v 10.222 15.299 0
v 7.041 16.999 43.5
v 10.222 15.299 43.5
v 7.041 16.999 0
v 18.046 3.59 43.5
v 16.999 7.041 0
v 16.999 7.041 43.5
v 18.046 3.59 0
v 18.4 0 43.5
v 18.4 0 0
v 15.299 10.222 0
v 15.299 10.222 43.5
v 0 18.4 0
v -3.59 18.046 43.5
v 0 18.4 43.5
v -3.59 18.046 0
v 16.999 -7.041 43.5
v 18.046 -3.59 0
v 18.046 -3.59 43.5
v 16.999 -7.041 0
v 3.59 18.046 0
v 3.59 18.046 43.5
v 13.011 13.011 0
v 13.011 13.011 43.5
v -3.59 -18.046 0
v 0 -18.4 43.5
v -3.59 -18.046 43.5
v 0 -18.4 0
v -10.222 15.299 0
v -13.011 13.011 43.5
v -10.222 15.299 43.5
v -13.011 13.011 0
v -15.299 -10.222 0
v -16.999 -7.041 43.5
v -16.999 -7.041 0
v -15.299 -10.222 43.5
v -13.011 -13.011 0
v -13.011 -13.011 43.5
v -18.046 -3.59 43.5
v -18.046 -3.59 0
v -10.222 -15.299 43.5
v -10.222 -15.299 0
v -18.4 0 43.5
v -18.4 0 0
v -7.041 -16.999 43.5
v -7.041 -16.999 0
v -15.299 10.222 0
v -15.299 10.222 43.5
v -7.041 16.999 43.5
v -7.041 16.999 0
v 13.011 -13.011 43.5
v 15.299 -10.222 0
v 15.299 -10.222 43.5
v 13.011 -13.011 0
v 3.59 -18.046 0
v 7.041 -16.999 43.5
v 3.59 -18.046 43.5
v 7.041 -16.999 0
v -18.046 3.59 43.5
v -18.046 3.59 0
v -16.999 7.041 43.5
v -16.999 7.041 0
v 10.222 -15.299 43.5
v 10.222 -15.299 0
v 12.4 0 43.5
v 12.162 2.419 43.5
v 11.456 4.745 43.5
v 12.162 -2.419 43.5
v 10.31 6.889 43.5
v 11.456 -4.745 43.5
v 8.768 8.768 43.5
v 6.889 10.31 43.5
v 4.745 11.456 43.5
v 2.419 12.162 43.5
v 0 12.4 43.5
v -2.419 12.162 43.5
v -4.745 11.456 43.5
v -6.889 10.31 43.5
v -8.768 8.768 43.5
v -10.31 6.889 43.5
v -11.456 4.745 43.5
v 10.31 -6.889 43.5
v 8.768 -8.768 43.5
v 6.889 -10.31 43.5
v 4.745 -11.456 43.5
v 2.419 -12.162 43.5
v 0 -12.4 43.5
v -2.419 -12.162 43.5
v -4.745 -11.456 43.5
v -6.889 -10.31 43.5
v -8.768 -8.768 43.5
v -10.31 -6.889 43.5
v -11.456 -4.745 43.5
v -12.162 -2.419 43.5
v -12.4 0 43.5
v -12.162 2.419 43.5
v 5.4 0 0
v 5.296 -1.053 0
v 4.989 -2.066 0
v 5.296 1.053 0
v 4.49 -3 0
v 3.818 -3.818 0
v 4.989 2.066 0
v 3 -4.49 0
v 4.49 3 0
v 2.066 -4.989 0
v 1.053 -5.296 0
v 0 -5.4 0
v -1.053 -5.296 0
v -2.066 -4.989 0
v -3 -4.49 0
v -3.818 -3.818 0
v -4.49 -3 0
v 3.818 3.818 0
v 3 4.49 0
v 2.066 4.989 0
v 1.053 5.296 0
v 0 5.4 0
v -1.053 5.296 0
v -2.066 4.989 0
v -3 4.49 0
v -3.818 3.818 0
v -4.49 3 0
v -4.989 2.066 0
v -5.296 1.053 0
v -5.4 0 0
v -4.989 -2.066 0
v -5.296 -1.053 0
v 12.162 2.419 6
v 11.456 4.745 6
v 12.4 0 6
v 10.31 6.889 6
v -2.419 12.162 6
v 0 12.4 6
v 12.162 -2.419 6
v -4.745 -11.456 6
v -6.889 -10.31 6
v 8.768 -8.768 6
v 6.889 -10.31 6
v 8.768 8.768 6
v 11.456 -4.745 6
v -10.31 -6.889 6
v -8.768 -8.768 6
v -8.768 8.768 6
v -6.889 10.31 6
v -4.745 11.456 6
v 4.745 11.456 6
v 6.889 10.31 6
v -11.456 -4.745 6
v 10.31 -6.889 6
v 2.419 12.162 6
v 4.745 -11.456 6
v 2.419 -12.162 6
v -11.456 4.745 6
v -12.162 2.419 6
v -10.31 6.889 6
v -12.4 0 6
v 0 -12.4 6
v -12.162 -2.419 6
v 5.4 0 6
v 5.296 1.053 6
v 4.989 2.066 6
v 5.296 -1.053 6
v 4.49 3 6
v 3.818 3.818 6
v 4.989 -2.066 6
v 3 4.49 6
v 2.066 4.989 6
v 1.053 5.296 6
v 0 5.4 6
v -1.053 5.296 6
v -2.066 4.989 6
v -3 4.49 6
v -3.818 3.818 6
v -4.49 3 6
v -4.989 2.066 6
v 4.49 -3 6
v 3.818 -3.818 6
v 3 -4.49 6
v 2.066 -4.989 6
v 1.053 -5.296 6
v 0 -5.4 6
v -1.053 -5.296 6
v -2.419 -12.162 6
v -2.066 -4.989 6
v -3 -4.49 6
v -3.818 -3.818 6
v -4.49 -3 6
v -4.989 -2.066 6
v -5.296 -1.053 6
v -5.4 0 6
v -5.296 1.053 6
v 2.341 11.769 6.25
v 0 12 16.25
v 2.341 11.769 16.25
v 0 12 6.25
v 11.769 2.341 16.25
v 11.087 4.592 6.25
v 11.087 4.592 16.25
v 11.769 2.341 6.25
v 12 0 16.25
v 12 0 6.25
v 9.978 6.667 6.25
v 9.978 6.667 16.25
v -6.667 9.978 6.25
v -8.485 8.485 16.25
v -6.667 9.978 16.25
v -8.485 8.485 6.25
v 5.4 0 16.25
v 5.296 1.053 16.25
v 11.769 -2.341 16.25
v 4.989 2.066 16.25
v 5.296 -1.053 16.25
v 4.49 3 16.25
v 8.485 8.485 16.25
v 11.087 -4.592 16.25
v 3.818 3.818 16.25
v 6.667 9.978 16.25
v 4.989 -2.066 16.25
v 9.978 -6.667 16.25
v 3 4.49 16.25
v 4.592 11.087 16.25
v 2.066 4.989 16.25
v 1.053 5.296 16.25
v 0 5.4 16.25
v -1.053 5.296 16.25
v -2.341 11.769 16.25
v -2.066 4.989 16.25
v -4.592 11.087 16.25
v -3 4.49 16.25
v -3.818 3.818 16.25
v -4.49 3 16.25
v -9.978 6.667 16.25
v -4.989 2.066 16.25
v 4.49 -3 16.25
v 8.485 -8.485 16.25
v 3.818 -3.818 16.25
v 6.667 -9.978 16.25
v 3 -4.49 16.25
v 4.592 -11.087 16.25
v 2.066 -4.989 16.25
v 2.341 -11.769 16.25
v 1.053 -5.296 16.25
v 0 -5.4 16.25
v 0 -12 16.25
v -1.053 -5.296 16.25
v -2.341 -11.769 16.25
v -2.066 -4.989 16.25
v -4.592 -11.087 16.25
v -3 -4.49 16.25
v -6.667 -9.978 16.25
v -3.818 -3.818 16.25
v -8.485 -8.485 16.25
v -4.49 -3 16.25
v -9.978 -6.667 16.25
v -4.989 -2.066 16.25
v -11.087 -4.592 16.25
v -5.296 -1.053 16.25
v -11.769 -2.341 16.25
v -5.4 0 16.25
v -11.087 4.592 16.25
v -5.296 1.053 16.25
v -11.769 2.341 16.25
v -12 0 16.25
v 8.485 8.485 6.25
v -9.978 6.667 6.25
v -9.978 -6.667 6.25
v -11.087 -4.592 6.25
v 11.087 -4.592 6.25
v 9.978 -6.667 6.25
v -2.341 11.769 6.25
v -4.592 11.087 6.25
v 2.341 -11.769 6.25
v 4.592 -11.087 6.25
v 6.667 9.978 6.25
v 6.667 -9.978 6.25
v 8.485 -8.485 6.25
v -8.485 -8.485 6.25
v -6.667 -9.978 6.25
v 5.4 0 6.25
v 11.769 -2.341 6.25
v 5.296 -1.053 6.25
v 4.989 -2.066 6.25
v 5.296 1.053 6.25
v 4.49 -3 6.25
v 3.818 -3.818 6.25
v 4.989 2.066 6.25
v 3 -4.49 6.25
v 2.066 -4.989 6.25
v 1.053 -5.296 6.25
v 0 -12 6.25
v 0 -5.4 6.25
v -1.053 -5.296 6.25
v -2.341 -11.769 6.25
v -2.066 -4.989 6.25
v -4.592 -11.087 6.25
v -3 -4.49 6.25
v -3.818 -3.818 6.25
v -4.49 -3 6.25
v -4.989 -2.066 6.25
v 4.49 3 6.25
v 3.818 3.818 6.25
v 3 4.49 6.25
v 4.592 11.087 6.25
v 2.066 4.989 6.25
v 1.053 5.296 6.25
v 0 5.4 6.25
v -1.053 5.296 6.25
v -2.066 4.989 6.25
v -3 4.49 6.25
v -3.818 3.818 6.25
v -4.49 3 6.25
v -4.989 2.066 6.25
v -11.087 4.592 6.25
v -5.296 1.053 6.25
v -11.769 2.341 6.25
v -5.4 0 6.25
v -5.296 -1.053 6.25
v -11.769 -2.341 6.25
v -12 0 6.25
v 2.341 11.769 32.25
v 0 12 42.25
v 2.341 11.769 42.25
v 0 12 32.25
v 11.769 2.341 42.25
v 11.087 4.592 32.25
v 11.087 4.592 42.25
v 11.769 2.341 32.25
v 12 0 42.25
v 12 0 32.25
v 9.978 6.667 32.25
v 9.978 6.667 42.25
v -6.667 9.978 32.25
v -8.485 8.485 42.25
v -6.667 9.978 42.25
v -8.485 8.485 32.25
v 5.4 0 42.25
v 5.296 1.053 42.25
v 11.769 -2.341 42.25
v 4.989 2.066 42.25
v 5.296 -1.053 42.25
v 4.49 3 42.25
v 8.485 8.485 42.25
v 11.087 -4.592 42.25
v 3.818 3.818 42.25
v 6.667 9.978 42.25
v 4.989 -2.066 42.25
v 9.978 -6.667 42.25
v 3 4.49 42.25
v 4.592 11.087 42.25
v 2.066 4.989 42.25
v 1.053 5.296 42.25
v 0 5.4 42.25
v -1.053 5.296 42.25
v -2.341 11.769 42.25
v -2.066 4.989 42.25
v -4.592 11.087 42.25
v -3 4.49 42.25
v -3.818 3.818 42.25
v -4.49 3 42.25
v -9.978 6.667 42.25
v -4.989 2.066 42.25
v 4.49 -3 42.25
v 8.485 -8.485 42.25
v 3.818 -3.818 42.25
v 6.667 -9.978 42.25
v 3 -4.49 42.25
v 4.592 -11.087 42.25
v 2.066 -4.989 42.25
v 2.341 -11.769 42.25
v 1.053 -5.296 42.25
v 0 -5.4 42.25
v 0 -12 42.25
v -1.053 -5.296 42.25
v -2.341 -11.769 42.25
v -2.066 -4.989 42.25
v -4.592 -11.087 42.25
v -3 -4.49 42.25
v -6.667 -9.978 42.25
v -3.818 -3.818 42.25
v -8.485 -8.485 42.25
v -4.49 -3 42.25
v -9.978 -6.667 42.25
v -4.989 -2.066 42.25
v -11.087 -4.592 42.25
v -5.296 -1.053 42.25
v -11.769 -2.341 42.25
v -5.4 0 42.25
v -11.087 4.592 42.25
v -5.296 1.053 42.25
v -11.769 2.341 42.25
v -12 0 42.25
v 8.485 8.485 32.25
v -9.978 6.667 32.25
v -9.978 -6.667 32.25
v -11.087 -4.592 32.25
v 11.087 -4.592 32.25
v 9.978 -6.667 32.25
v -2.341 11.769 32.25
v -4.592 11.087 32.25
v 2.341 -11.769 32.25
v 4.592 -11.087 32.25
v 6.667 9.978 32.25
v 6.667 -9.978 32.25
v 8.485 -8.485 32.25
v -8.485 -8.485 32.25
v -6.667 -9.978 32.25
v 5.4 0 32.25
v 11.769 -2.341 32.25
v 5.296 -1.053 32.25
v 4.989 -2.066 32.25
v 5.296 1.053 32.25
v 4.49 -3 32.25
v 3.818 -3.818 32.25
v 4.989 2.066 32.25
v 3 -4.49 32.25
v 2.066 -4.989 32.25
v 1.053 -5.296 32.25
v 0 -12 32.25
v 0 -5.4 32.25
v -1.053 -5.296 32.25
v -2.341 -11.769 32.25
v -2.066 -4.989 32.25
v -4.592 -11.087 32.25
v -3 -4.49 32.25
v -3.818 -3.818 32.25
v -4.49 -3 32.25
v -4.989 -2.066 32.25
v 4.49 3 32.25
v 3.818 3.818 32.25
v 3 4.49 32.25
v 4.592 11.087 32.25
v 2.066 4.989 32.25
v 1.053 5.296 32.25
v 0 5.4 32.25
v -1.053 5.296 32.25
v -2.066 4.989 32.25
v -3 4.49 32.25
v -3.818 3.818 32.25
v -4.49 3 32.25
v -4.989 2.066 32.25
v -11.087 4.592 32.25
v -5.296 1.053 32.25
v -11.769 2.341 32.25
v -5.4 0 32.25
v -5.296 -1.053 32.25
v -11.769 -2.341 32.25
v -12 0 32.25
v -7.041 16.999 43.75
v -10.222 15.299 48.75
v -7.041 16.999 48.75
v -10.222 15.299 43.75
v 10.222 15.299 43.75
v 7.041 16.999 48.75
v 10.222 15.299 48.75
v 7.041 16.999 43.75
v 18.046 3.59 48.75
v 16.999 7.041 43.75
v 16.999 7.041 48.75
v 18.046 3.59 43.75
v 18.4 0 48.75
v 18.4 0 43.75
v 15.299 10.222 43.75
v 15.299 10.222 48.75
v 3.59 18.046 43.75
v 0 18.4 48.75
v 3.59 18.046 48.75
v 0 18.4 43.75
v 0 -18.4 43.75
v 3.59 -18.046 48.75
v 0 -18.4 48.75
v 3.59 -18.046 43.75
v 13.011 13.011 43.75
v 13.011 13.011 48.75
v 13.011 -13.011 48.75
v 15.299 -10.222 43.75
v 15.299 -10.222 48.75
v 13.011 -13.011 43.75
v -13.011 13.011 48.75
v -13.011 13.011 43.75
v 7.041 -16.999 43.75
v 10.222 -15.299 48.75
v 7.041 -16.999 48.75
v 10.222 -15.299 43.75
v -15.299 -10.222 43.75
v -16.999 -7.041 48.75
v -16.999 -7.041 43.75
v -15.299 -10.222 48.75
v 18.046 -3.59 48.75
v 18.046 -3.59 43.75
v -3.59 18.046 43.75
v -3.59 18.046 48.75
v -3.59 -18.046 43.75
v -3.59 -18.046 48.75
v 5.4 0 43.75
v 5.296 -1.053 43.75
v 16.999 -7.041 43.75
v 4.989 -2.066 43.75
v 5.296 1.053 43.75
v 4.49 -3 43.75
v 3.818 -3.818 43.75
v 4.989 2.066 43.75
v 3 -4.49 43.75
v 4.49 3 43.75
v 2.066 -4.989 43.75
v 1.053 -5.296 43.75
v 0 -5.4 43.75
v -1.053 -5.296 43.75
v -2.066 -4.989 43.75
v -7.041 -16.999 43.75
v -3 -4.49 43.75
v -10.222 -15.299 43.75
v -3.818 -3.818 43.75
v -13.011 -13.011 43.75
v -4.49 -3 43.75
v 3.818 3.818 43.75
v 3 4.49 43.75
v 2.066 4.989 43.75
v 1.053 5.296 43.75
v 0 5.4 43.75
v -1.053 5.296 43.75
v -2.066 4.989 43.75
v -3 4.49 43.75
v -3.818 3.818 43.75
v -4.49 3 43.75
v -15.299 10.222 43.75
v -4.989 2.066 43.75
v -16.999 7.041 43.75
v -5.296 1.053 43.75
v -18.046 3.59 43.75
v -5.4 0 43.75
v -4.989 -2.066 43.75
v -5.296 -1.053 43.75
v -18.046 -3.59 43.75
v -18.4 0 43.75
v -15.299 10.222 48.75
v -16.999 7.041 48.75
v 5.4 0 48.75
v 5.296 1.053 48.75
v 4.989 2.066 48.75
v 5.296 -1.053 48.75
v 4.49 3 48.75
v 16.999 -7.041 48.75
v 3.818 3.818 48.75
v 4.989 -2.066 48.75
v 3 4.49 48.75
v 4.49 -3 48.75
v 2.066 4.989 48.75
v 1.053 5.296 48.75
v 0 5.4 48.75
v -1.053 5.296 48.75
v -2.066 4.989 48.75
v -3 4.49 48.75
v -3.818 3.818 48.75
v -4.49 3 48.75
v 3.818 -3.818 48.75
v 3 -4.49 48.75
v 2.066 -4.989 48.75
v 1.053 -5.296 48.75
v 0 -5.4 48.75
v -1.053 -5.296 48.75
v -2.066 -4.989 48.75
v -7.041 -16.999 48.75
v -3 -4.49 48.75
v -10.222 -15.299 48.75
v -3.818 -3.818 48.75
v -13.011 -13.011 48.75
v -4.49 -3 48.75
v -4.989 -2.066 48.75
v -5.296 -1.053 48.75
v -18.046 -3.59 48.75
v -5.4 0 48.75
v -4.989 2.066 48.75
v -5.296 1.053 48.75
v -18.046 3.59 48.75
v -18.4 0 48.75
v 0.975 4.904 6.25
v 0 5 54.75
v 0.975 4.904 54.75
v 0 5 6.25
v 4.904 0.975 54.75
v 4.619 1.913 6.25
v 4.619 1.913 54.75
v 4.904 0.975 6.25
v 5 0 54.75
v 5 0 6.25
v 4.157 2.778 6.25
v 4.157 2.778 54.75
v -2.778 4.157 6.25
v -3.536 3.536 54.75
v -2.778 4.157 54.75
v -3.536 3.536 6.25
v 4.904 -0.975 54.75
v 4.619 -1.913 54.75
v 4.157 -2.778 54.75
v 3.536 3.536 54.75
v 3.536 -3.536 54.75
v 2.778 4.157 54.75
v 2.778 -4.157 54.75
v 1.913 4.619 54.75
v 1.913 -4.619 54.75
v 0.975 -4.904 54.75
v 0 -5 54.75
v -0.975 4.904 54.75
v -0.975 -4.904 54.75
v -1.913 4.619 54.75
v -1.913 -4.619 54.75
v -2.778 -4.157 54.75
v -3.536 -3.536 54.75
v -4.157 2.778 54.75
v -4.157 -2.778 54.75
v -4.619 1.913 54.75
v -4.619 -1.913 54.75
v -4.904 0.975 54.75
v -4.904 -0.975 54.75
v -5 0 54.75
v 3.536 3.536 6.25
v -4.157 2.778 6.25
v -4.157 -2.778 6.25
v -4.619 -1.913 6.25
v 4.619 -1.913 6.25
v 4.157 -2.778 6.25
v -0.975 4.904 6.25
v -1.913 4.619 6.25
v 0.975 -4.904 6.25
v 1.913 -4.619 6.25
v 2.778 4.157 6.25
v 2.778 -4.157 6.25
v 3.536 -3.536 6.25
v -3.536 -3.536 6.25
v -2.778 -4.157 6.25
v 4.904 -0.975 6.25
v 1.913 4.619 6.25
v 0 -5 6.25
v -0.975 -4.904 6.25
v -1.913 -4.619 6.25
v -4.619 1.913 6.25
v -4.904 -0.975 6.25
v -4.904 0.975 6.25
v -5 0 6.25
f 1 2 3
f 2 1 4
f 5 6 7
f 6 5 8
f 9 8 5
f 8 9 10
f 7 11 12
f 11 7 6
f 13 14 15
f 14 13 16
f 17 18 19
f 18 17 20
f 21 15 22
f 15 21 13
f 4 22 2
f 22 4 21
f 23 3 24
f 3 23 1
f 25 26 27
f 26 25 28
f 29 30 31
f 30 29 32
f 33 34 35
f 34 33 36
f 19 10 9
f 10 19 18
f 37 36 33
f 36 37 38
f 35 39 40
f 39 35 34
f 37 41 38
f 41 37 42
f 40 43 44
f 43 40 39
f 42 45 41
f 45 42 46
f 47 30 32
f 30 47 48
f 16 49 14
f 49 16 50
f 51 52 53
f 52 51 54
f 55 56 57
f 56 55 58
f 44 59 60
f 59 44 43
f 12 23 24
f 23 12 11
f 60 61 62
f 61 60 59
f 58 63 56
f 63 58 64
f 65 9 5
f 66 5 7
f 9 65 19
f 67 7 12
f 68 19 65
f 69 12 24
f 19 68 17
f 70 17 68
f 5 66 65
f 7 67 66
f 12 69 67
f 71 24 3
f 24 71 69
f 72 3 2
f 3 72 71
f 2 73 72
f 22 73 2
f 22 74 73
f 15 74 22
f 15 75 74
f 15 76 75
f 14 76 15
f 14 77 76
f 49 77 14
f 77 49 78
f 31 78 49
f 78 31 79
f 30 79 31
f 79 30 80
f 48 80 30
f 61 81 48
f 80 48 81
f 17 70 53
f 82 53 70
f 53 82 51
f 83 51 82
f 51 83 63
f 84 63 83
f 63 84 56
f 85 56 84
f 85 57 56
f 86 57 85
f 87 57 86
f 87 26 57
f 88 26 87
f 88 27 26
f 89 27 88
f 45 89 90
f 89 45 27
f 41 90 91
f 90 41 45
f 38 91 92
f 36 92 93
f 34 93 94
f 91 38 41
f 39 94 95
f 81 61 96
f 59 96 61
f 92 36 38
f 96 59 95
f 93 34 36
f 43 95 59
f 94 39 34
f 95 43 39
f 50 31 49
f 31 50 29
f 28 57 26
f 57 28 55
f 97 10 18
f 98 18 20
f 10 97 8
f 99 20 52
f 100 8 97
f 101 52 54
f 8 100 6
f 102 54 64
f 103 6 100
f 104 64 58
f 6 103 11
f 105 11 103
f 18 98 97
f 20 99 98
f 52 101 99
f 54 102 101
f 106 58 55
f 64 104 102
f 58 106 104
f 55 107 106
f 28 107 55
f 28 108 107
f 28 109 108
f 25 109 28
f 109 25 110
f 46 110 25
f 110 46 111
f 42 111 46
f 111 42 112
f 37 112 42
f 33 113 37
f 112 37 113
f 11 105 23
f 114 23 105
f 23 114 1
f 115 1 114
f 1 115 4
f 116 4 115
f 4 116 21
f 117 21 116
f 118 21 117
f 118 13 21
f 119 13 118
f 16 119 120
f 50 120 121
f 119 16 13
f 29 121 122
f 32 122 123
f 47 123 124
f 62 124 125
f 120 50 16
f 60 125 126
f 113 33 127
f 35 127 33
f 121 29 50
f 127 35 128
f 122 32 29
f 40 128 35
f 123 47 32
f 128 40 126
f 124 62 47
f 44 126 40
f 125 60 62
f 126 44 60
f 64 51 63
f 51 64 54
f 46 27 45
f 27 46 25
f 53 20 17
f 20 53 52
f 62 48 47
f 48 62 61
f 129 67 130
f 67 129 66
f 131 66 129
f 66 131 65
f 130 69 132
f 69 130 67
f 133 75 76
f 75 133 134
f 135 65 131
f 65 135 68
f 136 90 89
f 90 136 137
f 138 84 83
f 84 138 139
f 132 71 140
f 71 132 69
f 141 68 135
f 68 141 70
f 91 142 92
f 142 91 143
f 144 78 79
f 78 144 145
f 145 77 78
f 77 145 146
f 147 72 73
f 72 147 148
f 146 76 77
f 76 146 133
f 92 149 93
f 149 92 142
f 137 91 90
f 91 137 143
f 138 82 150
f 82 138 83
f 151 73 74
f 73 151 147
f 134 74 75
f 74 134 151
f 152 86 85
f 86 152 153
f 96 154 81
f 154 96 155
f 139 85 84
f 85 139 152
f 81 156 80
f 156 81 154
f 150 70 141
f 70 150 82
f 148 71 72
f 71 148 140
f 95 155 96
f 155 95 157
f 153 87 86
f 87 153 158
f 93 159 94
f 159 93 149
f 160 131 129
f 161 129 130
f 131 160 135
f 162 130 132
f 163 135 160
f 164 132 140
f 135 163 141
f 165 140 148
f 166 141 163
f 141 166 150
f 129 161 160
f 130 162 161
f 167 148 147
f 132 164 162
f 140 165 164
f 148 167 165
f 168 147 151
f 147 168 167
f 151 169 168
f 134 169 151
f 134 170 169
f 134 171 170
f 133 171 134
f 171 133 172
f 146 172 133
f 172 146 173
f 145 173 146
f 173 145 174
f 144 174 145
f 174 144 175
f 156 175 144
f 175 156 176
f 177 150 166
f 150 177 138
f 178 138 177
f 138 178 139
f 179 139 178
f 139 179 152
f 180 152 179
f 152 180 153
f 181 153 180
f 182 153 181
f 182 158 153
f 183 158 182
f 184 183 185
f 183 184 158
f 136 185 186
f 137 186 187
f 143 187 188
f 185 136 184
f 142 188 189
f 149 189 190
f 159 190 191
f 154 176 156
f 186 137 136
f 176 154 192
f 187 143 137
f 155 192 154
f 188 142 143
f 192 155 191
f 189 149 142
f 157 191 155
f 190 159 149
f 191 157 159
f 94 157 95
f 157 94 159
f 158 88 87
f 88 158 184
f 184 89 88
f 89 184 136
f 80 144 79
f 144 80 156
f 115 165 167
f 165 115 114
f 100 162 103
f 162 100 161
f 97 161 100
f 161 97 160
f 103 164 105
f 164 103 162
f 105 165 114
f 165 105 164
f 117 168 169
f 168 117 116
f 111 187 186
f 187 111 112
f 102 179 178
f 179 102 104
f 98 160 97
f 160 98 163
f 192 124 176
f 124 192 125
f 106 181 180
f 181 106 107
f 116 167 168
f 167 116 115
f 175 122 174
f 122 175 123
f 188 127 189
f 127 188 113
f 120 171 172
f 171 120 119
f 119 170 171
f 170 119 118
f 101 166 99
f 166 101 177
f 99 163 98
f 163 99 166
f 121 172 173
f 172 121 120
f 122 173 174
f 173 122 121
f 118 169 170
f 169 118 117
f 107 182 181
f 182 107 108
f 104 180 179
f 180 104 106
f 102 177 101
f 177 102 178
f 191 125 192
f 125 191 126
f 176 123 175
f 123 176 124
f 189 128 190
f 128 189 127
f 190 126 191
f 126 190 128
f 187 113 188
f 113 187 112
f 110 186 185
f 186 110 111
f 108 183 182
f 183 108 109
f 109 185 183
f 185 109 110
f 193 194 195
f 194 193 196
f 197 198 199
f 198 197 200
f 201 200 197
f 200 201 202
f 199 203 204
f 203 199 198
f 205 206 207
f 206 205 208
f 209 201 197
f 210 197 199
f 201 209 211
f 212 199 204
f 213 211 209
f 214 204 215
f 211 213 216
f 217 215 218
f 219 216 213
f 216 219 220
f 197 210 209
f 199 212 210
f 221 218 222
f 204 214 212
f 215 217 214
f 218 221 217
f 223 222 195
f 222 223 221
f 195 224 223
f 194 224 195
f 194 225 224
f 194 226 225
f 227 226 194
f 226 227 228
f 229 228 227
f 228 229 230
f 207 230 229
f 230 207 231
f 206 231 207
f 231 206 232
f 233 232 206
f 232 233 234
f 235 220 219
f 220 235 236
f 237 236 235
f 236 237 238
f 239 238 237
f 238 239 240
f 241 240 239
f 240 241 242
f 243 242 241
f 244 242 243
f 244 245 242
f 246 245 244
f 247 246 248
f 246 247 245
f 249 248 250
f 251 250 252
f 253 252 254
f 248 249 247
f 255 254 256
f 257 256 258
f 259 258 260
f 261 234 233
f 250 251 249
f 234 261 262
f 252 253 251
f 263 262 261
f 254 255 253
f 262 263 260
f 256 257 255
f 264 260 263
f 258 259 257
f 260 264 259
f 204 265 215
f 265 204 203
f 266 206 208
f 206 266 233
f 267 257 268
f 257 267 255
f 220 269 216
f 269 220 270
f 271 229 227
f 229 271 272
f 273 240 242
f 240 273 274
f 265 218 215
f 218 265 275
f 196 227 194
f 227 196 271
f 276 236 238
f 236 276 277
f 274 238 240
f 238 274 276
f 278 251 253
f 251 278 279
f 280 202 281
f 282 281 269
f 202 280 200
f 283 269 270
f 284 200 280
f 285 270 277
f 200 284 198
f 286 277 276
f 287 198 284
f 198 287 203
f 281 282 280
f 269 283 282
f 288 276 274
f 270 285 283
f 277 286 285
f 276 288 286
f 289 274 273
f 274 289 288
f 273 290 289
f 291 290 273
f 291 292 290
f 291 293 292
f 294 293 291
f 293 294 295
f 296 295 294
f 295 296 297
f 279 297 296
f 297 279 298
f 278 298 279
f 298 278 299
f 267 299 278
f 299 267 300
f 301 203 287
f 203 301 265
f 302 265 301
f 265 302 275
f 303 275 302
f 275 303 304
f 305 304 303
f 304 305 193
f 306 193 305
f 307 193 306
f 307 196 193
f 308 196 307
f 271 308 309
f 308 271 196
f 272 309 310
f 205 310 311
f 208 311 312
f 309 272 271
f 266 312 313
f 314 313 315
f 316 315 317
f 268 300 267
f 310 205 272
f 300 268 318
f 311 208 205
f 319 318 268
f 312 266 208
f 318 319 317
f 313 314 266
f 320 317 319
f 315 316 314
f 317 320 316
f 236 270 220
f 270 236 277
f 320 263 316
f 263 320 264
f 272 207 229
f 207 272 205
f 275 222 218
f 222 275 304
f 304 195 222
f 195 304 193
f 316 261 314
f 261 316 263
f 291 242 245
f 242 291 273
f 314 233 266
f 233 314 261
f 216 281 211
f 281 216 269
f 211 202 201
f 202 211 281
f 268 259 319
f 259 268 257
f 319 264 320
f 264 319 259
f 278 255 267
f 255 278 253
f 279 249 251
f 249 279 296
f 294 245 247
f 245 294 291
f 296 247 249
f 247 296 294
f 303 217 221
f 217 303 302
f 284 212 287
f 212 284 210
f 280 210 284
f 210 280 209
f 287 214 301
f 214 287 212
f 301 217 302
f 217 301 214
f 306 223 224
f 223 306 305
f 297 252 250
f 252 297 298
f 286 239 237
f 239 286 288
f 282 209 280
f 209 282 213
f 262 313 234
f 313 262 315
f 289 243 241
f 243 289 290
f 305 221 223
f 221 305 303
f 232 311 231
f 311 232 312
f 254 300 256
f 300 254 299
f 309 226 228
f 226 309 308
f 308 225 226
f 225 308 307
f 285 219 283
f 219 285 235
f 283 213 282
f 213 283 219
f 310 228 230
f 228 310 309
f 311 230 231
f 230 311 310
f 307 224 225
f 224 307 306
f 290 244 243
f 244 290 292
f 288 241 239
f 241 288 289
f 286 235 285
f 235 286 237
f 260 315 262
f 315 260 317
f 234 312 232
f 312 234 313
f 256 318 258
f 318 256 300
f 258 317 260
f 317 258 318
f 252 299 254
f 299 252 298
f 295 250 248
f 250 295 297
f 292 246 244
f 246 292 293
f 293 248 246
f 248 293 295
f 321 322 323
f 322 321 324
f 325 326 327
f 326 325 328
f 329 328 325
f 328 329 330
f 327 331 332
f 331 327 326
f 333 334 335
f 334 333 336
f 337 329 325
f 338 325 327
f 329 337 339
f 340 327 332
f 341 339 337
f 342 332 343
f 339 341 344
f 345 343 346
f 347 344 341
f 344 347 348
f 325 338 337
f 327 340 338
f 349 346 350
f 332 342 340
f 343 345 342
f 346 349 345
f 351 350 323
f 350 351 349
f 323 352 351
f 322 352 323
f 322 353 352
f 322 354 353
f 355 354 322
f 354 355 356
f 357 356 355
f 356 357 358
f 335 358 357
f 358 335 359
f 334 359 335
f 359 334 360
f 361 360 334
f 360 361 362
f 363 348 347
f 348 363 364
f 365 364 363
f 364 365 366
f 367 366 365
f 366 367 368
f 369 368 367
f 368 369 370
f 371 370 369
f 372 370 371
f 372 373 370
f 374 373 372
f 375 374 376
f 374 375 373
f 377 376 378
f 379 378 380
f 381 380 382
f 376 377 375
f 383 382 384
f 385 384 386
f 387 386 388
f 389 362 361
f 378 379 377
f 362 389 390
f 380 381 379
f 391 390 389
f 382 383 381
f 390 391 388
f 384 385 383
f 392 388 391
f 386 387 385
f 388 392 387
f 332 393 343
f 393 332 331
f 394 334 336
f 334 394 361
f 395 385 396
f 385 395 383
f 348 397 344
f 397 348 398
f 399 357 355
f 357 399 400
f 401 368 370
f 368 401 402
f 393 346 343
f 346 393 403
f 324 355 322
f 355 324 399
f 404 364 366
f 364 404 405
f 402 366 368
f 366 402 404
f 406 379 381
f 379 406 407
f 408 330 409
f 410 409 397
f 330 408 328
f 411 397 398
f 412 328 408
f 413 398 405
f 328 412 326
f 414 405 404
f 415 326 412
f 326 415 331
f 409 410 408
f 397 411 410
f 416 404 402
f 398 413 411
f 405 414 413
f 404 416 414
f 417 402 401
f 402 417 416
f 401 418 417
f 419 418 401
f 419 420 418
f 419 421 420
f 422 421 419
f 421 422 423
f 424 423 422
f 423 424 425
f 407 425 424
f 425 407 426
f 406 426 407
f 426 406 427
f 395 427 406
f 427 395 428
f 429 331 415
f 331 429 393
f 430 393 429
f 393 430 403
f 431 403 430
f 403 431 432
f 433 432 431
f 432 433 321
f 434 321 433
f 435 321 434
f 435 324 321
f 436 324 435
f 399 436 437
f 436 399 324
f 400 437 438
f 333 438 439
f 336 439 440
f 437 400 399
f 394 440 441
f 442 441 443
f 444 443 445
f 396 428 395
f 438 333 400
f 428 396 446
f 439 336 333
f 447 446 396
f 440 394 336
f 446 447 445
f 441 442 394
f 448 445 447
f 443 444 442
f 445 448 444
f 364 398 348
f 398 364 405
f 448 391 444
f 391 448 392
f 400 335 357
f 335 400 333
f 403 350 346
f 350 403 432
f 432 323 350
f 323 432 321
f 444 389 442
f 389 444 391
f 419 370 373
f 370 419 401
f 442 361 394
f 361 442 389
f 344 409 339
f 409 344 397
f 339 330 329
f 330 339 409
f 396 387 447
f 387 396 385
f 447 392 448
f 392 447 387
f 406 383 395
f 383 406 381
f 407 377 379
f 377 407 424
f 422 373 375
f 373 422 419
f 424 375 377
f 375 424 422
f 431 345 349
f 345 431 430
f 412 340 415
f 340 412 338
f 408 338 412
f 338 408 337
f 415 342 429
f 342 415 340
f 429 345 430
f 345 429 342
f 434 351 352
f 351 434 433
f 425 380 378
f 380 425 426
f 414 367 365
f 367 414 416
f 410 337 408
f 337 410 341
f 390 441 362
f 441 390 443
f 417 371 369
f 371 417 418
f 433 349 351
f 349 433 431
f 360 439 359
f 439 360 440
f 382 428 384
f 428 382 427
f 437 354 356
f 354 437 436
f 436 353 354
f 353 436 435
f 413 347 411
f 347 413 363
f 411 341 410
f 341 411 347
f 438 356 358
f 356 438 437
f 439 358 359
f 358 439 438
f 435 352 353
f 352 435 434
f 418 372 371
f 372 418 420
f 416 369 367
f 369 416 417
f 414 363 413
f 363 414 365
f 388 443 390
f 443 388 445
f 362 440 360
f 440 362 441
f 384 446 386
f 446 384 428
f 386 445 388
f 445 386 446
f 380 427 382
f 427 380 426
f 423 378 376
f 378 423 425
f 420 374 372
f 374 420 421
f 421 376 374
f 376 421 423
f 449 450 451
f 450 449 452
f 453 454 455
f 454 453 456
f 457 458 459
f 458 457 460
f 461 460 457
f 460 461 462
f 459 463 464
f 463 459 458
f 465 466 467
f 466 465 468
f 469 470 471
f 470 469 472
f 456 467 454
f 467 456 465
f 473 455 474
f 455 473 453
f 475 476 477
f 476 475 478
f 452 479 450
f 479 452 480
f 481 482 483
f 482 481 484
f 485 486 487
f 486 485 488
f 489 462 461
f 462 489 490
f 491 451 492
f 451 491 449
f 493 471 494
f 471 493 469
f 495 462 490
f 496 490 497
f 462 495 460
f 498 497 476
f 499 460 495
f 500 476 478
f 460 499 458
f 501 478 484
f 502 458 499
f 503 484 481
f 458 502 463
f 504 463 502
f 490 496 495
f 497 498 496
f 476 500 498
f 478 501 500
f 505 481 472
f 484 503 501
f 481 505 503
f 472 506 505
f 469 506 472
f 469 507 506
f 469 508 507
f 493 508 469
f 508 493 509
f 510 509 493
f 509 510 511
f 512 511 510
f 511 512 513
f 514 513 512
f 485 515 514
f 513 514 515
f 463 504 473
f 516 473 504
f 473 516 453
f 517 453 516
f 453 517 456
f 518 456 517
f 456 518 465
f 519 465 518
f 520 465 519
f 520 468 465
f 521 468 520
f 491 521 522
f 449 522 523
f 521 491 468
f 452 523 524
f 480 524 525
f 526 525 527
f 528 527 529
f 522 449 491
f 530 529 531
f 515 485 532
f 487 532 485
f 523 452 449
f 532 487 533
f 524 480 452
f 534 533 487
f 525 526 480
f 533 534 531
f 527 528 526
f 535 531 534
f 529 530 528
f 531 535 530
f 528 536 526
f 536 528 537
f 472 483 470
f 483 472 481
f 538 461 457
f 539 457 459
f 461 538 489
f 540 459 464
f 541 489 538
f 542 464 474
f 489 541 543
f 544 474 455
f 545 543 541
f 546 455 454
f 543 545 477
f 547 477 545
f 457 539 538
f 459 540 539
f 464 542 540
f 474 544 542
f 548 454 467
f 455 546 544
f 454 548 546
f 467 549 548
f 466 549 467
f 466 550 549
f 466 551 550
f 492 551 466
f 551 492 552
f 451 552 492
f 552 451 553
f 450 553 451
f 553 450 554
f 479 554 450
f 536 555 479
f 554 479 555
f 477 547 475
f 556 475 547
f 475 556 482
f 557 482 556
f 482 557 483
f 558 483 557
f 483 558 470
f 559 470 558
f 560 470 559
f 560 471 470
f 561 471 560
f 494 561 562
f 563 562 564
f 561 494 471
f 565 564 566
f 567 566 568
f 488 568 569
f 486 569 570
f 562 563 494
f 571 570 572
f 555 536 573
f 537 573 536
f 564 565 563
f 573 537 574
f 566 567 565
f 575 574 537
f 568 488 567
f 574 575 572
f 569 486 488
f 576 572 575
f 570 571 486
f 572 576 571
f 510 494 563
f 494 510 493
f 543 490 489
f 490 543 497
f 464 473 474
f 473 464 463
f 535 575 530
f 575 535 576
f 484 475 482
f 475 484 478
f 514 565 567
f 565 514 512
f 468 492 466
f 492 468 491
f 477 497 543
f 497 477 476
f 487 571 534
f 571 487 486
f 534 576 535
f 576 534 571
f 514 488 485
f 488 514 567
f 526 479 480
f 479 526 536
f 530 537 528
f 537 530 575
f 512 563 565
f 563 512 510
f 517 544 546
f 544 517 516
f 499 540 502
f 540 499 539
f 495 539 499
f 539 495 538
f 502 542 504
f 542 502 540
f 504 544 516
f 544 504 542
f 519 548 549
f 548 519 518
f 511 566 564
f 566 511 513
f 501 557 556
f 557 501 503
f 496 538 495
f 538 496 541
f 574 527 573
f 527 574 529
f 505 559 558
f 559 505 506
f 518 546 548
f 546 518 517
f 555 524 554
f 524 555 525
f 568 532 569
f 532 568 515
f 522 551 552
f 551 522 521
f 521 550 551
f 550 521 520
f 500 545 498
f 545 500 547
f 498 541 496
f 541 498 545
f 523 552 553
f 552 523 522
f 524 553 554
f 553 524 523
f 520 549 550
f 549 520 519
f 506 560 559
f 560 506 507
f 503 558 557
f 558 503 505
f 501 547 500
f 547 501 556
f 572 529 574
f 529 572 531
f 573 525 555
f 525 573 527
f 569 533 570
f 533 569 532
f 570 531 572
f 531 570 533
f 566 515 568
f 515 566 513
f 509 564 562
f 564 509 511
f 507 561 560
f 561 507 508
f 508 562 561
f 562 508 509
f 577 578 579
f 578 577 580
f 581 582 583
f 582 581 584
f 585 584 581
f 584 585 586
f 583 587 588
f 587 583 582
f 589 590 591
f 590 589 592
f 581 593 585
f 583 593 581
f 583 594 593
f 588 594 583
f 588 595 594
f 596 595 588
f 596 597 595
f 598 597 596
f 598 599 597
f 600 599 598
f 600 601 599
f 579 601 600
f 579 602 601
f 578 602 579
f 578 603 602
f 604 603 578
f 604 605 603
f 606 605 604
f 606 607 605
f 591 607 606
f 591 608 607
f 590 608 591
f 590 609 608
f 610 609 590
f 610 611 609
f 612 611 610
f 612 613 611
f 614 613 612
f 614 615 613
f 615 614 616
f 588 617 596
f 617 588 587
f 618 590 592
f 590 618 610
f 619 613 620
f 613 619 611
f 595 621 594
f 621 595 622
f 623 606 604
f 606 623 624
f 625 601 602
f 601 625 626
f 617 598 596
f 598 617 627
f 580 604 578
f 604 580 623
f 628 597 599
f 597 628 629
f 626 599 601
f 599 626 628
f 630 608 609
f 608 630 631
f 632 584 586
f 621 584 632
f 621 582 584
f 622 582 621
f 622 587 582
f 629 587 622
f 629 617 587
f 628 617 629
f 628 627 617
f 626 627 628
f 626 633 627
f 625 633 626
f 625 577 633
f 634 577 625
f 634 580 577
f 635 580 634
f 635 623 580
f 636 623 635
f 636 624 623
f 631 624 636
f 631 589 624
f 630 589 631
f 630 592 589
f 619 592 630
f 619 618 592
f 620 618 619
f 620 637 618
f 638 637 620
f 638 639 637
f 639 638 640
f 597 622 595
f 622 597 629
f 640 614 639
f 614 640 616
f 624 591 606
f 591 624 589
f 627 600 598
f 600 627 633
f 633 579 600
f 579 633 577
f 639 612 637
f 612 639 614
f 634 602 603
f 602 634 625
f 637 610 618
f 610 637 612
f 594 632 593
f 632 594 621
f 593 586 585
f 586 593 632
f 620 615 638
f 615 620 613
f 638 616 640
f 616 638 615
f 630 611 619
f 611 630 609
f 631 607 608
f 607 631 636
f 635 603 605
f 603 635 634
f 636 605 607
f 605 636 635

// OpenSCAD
$fn = 32;

// ------------------------------------------------------------------------
// Shaft station: cup d36.8 x 43.5 mm, shaft d10
// Every part is its own module, assembly() places every instance.
// ------------------------------------------------------------------------

// --- part 1 ---
module housing_cup() {
  difference() {
    cylinder(h = 43.5, d = 36.8);
    translate([0, 0, 6]) cylinder(h = 38.5, d = 24.8);
    translate([0, 0, -1]) cylinder(h = 8, d = 10.8);
  }
}

// --- part 2 ---
module bearing_lower() {
  difference() {
      translate([0, 0, 0]) cylinder(h = 10, d = 24);
      translate([0, 0, -1]) cylinder(h = 12, d = 10.8);
    }
}

// --- part 3 ---
module bearing_upper() {
  difference() {
      translate([0, 0, 0]) cylinder(h = 10, d = 24);
      translate([0, 0, -1]) cylinder(h = 12, d = 10.8);
    }
}

// --- part 4 ---
module station_shaft() {
  translate([0, 0, -24.25]) cylinder(h = 48.5, d = 10);
}

// --- part 5 ---
module station_cover() {
  difference() {
    cylinder(h = 5, d = 36.8);
    translate([0, 0, -1]) cylinder(h = 7, d = 10.8);
  }
}

// --- assembly ---
module assembly() {
  color([0.80, 0.24, 0.20]) translate([0, 0, 0]) rotate([0, 0, 0]) housing_cup();
  color([0.20, 0.45, 0.75]) translate([0, 0, 6.25]) rotate([0, 0, 0]) bearing_lower();
  color([0.25, 0.62, 0.32]) translate([0, 0, 32.25]) rotate([0, 0, 0]) bearing_upper();
  color([0.92, 0.70, 0.18]) translate([0, 0, 30.5]) rotate([0, 0, 0]) station_shaft();
  color([0.58, 0.35, 0.70]) translate([0, 0, 43.75]) rotate([0, 0, 0]) station_cover();
}

assembly();
